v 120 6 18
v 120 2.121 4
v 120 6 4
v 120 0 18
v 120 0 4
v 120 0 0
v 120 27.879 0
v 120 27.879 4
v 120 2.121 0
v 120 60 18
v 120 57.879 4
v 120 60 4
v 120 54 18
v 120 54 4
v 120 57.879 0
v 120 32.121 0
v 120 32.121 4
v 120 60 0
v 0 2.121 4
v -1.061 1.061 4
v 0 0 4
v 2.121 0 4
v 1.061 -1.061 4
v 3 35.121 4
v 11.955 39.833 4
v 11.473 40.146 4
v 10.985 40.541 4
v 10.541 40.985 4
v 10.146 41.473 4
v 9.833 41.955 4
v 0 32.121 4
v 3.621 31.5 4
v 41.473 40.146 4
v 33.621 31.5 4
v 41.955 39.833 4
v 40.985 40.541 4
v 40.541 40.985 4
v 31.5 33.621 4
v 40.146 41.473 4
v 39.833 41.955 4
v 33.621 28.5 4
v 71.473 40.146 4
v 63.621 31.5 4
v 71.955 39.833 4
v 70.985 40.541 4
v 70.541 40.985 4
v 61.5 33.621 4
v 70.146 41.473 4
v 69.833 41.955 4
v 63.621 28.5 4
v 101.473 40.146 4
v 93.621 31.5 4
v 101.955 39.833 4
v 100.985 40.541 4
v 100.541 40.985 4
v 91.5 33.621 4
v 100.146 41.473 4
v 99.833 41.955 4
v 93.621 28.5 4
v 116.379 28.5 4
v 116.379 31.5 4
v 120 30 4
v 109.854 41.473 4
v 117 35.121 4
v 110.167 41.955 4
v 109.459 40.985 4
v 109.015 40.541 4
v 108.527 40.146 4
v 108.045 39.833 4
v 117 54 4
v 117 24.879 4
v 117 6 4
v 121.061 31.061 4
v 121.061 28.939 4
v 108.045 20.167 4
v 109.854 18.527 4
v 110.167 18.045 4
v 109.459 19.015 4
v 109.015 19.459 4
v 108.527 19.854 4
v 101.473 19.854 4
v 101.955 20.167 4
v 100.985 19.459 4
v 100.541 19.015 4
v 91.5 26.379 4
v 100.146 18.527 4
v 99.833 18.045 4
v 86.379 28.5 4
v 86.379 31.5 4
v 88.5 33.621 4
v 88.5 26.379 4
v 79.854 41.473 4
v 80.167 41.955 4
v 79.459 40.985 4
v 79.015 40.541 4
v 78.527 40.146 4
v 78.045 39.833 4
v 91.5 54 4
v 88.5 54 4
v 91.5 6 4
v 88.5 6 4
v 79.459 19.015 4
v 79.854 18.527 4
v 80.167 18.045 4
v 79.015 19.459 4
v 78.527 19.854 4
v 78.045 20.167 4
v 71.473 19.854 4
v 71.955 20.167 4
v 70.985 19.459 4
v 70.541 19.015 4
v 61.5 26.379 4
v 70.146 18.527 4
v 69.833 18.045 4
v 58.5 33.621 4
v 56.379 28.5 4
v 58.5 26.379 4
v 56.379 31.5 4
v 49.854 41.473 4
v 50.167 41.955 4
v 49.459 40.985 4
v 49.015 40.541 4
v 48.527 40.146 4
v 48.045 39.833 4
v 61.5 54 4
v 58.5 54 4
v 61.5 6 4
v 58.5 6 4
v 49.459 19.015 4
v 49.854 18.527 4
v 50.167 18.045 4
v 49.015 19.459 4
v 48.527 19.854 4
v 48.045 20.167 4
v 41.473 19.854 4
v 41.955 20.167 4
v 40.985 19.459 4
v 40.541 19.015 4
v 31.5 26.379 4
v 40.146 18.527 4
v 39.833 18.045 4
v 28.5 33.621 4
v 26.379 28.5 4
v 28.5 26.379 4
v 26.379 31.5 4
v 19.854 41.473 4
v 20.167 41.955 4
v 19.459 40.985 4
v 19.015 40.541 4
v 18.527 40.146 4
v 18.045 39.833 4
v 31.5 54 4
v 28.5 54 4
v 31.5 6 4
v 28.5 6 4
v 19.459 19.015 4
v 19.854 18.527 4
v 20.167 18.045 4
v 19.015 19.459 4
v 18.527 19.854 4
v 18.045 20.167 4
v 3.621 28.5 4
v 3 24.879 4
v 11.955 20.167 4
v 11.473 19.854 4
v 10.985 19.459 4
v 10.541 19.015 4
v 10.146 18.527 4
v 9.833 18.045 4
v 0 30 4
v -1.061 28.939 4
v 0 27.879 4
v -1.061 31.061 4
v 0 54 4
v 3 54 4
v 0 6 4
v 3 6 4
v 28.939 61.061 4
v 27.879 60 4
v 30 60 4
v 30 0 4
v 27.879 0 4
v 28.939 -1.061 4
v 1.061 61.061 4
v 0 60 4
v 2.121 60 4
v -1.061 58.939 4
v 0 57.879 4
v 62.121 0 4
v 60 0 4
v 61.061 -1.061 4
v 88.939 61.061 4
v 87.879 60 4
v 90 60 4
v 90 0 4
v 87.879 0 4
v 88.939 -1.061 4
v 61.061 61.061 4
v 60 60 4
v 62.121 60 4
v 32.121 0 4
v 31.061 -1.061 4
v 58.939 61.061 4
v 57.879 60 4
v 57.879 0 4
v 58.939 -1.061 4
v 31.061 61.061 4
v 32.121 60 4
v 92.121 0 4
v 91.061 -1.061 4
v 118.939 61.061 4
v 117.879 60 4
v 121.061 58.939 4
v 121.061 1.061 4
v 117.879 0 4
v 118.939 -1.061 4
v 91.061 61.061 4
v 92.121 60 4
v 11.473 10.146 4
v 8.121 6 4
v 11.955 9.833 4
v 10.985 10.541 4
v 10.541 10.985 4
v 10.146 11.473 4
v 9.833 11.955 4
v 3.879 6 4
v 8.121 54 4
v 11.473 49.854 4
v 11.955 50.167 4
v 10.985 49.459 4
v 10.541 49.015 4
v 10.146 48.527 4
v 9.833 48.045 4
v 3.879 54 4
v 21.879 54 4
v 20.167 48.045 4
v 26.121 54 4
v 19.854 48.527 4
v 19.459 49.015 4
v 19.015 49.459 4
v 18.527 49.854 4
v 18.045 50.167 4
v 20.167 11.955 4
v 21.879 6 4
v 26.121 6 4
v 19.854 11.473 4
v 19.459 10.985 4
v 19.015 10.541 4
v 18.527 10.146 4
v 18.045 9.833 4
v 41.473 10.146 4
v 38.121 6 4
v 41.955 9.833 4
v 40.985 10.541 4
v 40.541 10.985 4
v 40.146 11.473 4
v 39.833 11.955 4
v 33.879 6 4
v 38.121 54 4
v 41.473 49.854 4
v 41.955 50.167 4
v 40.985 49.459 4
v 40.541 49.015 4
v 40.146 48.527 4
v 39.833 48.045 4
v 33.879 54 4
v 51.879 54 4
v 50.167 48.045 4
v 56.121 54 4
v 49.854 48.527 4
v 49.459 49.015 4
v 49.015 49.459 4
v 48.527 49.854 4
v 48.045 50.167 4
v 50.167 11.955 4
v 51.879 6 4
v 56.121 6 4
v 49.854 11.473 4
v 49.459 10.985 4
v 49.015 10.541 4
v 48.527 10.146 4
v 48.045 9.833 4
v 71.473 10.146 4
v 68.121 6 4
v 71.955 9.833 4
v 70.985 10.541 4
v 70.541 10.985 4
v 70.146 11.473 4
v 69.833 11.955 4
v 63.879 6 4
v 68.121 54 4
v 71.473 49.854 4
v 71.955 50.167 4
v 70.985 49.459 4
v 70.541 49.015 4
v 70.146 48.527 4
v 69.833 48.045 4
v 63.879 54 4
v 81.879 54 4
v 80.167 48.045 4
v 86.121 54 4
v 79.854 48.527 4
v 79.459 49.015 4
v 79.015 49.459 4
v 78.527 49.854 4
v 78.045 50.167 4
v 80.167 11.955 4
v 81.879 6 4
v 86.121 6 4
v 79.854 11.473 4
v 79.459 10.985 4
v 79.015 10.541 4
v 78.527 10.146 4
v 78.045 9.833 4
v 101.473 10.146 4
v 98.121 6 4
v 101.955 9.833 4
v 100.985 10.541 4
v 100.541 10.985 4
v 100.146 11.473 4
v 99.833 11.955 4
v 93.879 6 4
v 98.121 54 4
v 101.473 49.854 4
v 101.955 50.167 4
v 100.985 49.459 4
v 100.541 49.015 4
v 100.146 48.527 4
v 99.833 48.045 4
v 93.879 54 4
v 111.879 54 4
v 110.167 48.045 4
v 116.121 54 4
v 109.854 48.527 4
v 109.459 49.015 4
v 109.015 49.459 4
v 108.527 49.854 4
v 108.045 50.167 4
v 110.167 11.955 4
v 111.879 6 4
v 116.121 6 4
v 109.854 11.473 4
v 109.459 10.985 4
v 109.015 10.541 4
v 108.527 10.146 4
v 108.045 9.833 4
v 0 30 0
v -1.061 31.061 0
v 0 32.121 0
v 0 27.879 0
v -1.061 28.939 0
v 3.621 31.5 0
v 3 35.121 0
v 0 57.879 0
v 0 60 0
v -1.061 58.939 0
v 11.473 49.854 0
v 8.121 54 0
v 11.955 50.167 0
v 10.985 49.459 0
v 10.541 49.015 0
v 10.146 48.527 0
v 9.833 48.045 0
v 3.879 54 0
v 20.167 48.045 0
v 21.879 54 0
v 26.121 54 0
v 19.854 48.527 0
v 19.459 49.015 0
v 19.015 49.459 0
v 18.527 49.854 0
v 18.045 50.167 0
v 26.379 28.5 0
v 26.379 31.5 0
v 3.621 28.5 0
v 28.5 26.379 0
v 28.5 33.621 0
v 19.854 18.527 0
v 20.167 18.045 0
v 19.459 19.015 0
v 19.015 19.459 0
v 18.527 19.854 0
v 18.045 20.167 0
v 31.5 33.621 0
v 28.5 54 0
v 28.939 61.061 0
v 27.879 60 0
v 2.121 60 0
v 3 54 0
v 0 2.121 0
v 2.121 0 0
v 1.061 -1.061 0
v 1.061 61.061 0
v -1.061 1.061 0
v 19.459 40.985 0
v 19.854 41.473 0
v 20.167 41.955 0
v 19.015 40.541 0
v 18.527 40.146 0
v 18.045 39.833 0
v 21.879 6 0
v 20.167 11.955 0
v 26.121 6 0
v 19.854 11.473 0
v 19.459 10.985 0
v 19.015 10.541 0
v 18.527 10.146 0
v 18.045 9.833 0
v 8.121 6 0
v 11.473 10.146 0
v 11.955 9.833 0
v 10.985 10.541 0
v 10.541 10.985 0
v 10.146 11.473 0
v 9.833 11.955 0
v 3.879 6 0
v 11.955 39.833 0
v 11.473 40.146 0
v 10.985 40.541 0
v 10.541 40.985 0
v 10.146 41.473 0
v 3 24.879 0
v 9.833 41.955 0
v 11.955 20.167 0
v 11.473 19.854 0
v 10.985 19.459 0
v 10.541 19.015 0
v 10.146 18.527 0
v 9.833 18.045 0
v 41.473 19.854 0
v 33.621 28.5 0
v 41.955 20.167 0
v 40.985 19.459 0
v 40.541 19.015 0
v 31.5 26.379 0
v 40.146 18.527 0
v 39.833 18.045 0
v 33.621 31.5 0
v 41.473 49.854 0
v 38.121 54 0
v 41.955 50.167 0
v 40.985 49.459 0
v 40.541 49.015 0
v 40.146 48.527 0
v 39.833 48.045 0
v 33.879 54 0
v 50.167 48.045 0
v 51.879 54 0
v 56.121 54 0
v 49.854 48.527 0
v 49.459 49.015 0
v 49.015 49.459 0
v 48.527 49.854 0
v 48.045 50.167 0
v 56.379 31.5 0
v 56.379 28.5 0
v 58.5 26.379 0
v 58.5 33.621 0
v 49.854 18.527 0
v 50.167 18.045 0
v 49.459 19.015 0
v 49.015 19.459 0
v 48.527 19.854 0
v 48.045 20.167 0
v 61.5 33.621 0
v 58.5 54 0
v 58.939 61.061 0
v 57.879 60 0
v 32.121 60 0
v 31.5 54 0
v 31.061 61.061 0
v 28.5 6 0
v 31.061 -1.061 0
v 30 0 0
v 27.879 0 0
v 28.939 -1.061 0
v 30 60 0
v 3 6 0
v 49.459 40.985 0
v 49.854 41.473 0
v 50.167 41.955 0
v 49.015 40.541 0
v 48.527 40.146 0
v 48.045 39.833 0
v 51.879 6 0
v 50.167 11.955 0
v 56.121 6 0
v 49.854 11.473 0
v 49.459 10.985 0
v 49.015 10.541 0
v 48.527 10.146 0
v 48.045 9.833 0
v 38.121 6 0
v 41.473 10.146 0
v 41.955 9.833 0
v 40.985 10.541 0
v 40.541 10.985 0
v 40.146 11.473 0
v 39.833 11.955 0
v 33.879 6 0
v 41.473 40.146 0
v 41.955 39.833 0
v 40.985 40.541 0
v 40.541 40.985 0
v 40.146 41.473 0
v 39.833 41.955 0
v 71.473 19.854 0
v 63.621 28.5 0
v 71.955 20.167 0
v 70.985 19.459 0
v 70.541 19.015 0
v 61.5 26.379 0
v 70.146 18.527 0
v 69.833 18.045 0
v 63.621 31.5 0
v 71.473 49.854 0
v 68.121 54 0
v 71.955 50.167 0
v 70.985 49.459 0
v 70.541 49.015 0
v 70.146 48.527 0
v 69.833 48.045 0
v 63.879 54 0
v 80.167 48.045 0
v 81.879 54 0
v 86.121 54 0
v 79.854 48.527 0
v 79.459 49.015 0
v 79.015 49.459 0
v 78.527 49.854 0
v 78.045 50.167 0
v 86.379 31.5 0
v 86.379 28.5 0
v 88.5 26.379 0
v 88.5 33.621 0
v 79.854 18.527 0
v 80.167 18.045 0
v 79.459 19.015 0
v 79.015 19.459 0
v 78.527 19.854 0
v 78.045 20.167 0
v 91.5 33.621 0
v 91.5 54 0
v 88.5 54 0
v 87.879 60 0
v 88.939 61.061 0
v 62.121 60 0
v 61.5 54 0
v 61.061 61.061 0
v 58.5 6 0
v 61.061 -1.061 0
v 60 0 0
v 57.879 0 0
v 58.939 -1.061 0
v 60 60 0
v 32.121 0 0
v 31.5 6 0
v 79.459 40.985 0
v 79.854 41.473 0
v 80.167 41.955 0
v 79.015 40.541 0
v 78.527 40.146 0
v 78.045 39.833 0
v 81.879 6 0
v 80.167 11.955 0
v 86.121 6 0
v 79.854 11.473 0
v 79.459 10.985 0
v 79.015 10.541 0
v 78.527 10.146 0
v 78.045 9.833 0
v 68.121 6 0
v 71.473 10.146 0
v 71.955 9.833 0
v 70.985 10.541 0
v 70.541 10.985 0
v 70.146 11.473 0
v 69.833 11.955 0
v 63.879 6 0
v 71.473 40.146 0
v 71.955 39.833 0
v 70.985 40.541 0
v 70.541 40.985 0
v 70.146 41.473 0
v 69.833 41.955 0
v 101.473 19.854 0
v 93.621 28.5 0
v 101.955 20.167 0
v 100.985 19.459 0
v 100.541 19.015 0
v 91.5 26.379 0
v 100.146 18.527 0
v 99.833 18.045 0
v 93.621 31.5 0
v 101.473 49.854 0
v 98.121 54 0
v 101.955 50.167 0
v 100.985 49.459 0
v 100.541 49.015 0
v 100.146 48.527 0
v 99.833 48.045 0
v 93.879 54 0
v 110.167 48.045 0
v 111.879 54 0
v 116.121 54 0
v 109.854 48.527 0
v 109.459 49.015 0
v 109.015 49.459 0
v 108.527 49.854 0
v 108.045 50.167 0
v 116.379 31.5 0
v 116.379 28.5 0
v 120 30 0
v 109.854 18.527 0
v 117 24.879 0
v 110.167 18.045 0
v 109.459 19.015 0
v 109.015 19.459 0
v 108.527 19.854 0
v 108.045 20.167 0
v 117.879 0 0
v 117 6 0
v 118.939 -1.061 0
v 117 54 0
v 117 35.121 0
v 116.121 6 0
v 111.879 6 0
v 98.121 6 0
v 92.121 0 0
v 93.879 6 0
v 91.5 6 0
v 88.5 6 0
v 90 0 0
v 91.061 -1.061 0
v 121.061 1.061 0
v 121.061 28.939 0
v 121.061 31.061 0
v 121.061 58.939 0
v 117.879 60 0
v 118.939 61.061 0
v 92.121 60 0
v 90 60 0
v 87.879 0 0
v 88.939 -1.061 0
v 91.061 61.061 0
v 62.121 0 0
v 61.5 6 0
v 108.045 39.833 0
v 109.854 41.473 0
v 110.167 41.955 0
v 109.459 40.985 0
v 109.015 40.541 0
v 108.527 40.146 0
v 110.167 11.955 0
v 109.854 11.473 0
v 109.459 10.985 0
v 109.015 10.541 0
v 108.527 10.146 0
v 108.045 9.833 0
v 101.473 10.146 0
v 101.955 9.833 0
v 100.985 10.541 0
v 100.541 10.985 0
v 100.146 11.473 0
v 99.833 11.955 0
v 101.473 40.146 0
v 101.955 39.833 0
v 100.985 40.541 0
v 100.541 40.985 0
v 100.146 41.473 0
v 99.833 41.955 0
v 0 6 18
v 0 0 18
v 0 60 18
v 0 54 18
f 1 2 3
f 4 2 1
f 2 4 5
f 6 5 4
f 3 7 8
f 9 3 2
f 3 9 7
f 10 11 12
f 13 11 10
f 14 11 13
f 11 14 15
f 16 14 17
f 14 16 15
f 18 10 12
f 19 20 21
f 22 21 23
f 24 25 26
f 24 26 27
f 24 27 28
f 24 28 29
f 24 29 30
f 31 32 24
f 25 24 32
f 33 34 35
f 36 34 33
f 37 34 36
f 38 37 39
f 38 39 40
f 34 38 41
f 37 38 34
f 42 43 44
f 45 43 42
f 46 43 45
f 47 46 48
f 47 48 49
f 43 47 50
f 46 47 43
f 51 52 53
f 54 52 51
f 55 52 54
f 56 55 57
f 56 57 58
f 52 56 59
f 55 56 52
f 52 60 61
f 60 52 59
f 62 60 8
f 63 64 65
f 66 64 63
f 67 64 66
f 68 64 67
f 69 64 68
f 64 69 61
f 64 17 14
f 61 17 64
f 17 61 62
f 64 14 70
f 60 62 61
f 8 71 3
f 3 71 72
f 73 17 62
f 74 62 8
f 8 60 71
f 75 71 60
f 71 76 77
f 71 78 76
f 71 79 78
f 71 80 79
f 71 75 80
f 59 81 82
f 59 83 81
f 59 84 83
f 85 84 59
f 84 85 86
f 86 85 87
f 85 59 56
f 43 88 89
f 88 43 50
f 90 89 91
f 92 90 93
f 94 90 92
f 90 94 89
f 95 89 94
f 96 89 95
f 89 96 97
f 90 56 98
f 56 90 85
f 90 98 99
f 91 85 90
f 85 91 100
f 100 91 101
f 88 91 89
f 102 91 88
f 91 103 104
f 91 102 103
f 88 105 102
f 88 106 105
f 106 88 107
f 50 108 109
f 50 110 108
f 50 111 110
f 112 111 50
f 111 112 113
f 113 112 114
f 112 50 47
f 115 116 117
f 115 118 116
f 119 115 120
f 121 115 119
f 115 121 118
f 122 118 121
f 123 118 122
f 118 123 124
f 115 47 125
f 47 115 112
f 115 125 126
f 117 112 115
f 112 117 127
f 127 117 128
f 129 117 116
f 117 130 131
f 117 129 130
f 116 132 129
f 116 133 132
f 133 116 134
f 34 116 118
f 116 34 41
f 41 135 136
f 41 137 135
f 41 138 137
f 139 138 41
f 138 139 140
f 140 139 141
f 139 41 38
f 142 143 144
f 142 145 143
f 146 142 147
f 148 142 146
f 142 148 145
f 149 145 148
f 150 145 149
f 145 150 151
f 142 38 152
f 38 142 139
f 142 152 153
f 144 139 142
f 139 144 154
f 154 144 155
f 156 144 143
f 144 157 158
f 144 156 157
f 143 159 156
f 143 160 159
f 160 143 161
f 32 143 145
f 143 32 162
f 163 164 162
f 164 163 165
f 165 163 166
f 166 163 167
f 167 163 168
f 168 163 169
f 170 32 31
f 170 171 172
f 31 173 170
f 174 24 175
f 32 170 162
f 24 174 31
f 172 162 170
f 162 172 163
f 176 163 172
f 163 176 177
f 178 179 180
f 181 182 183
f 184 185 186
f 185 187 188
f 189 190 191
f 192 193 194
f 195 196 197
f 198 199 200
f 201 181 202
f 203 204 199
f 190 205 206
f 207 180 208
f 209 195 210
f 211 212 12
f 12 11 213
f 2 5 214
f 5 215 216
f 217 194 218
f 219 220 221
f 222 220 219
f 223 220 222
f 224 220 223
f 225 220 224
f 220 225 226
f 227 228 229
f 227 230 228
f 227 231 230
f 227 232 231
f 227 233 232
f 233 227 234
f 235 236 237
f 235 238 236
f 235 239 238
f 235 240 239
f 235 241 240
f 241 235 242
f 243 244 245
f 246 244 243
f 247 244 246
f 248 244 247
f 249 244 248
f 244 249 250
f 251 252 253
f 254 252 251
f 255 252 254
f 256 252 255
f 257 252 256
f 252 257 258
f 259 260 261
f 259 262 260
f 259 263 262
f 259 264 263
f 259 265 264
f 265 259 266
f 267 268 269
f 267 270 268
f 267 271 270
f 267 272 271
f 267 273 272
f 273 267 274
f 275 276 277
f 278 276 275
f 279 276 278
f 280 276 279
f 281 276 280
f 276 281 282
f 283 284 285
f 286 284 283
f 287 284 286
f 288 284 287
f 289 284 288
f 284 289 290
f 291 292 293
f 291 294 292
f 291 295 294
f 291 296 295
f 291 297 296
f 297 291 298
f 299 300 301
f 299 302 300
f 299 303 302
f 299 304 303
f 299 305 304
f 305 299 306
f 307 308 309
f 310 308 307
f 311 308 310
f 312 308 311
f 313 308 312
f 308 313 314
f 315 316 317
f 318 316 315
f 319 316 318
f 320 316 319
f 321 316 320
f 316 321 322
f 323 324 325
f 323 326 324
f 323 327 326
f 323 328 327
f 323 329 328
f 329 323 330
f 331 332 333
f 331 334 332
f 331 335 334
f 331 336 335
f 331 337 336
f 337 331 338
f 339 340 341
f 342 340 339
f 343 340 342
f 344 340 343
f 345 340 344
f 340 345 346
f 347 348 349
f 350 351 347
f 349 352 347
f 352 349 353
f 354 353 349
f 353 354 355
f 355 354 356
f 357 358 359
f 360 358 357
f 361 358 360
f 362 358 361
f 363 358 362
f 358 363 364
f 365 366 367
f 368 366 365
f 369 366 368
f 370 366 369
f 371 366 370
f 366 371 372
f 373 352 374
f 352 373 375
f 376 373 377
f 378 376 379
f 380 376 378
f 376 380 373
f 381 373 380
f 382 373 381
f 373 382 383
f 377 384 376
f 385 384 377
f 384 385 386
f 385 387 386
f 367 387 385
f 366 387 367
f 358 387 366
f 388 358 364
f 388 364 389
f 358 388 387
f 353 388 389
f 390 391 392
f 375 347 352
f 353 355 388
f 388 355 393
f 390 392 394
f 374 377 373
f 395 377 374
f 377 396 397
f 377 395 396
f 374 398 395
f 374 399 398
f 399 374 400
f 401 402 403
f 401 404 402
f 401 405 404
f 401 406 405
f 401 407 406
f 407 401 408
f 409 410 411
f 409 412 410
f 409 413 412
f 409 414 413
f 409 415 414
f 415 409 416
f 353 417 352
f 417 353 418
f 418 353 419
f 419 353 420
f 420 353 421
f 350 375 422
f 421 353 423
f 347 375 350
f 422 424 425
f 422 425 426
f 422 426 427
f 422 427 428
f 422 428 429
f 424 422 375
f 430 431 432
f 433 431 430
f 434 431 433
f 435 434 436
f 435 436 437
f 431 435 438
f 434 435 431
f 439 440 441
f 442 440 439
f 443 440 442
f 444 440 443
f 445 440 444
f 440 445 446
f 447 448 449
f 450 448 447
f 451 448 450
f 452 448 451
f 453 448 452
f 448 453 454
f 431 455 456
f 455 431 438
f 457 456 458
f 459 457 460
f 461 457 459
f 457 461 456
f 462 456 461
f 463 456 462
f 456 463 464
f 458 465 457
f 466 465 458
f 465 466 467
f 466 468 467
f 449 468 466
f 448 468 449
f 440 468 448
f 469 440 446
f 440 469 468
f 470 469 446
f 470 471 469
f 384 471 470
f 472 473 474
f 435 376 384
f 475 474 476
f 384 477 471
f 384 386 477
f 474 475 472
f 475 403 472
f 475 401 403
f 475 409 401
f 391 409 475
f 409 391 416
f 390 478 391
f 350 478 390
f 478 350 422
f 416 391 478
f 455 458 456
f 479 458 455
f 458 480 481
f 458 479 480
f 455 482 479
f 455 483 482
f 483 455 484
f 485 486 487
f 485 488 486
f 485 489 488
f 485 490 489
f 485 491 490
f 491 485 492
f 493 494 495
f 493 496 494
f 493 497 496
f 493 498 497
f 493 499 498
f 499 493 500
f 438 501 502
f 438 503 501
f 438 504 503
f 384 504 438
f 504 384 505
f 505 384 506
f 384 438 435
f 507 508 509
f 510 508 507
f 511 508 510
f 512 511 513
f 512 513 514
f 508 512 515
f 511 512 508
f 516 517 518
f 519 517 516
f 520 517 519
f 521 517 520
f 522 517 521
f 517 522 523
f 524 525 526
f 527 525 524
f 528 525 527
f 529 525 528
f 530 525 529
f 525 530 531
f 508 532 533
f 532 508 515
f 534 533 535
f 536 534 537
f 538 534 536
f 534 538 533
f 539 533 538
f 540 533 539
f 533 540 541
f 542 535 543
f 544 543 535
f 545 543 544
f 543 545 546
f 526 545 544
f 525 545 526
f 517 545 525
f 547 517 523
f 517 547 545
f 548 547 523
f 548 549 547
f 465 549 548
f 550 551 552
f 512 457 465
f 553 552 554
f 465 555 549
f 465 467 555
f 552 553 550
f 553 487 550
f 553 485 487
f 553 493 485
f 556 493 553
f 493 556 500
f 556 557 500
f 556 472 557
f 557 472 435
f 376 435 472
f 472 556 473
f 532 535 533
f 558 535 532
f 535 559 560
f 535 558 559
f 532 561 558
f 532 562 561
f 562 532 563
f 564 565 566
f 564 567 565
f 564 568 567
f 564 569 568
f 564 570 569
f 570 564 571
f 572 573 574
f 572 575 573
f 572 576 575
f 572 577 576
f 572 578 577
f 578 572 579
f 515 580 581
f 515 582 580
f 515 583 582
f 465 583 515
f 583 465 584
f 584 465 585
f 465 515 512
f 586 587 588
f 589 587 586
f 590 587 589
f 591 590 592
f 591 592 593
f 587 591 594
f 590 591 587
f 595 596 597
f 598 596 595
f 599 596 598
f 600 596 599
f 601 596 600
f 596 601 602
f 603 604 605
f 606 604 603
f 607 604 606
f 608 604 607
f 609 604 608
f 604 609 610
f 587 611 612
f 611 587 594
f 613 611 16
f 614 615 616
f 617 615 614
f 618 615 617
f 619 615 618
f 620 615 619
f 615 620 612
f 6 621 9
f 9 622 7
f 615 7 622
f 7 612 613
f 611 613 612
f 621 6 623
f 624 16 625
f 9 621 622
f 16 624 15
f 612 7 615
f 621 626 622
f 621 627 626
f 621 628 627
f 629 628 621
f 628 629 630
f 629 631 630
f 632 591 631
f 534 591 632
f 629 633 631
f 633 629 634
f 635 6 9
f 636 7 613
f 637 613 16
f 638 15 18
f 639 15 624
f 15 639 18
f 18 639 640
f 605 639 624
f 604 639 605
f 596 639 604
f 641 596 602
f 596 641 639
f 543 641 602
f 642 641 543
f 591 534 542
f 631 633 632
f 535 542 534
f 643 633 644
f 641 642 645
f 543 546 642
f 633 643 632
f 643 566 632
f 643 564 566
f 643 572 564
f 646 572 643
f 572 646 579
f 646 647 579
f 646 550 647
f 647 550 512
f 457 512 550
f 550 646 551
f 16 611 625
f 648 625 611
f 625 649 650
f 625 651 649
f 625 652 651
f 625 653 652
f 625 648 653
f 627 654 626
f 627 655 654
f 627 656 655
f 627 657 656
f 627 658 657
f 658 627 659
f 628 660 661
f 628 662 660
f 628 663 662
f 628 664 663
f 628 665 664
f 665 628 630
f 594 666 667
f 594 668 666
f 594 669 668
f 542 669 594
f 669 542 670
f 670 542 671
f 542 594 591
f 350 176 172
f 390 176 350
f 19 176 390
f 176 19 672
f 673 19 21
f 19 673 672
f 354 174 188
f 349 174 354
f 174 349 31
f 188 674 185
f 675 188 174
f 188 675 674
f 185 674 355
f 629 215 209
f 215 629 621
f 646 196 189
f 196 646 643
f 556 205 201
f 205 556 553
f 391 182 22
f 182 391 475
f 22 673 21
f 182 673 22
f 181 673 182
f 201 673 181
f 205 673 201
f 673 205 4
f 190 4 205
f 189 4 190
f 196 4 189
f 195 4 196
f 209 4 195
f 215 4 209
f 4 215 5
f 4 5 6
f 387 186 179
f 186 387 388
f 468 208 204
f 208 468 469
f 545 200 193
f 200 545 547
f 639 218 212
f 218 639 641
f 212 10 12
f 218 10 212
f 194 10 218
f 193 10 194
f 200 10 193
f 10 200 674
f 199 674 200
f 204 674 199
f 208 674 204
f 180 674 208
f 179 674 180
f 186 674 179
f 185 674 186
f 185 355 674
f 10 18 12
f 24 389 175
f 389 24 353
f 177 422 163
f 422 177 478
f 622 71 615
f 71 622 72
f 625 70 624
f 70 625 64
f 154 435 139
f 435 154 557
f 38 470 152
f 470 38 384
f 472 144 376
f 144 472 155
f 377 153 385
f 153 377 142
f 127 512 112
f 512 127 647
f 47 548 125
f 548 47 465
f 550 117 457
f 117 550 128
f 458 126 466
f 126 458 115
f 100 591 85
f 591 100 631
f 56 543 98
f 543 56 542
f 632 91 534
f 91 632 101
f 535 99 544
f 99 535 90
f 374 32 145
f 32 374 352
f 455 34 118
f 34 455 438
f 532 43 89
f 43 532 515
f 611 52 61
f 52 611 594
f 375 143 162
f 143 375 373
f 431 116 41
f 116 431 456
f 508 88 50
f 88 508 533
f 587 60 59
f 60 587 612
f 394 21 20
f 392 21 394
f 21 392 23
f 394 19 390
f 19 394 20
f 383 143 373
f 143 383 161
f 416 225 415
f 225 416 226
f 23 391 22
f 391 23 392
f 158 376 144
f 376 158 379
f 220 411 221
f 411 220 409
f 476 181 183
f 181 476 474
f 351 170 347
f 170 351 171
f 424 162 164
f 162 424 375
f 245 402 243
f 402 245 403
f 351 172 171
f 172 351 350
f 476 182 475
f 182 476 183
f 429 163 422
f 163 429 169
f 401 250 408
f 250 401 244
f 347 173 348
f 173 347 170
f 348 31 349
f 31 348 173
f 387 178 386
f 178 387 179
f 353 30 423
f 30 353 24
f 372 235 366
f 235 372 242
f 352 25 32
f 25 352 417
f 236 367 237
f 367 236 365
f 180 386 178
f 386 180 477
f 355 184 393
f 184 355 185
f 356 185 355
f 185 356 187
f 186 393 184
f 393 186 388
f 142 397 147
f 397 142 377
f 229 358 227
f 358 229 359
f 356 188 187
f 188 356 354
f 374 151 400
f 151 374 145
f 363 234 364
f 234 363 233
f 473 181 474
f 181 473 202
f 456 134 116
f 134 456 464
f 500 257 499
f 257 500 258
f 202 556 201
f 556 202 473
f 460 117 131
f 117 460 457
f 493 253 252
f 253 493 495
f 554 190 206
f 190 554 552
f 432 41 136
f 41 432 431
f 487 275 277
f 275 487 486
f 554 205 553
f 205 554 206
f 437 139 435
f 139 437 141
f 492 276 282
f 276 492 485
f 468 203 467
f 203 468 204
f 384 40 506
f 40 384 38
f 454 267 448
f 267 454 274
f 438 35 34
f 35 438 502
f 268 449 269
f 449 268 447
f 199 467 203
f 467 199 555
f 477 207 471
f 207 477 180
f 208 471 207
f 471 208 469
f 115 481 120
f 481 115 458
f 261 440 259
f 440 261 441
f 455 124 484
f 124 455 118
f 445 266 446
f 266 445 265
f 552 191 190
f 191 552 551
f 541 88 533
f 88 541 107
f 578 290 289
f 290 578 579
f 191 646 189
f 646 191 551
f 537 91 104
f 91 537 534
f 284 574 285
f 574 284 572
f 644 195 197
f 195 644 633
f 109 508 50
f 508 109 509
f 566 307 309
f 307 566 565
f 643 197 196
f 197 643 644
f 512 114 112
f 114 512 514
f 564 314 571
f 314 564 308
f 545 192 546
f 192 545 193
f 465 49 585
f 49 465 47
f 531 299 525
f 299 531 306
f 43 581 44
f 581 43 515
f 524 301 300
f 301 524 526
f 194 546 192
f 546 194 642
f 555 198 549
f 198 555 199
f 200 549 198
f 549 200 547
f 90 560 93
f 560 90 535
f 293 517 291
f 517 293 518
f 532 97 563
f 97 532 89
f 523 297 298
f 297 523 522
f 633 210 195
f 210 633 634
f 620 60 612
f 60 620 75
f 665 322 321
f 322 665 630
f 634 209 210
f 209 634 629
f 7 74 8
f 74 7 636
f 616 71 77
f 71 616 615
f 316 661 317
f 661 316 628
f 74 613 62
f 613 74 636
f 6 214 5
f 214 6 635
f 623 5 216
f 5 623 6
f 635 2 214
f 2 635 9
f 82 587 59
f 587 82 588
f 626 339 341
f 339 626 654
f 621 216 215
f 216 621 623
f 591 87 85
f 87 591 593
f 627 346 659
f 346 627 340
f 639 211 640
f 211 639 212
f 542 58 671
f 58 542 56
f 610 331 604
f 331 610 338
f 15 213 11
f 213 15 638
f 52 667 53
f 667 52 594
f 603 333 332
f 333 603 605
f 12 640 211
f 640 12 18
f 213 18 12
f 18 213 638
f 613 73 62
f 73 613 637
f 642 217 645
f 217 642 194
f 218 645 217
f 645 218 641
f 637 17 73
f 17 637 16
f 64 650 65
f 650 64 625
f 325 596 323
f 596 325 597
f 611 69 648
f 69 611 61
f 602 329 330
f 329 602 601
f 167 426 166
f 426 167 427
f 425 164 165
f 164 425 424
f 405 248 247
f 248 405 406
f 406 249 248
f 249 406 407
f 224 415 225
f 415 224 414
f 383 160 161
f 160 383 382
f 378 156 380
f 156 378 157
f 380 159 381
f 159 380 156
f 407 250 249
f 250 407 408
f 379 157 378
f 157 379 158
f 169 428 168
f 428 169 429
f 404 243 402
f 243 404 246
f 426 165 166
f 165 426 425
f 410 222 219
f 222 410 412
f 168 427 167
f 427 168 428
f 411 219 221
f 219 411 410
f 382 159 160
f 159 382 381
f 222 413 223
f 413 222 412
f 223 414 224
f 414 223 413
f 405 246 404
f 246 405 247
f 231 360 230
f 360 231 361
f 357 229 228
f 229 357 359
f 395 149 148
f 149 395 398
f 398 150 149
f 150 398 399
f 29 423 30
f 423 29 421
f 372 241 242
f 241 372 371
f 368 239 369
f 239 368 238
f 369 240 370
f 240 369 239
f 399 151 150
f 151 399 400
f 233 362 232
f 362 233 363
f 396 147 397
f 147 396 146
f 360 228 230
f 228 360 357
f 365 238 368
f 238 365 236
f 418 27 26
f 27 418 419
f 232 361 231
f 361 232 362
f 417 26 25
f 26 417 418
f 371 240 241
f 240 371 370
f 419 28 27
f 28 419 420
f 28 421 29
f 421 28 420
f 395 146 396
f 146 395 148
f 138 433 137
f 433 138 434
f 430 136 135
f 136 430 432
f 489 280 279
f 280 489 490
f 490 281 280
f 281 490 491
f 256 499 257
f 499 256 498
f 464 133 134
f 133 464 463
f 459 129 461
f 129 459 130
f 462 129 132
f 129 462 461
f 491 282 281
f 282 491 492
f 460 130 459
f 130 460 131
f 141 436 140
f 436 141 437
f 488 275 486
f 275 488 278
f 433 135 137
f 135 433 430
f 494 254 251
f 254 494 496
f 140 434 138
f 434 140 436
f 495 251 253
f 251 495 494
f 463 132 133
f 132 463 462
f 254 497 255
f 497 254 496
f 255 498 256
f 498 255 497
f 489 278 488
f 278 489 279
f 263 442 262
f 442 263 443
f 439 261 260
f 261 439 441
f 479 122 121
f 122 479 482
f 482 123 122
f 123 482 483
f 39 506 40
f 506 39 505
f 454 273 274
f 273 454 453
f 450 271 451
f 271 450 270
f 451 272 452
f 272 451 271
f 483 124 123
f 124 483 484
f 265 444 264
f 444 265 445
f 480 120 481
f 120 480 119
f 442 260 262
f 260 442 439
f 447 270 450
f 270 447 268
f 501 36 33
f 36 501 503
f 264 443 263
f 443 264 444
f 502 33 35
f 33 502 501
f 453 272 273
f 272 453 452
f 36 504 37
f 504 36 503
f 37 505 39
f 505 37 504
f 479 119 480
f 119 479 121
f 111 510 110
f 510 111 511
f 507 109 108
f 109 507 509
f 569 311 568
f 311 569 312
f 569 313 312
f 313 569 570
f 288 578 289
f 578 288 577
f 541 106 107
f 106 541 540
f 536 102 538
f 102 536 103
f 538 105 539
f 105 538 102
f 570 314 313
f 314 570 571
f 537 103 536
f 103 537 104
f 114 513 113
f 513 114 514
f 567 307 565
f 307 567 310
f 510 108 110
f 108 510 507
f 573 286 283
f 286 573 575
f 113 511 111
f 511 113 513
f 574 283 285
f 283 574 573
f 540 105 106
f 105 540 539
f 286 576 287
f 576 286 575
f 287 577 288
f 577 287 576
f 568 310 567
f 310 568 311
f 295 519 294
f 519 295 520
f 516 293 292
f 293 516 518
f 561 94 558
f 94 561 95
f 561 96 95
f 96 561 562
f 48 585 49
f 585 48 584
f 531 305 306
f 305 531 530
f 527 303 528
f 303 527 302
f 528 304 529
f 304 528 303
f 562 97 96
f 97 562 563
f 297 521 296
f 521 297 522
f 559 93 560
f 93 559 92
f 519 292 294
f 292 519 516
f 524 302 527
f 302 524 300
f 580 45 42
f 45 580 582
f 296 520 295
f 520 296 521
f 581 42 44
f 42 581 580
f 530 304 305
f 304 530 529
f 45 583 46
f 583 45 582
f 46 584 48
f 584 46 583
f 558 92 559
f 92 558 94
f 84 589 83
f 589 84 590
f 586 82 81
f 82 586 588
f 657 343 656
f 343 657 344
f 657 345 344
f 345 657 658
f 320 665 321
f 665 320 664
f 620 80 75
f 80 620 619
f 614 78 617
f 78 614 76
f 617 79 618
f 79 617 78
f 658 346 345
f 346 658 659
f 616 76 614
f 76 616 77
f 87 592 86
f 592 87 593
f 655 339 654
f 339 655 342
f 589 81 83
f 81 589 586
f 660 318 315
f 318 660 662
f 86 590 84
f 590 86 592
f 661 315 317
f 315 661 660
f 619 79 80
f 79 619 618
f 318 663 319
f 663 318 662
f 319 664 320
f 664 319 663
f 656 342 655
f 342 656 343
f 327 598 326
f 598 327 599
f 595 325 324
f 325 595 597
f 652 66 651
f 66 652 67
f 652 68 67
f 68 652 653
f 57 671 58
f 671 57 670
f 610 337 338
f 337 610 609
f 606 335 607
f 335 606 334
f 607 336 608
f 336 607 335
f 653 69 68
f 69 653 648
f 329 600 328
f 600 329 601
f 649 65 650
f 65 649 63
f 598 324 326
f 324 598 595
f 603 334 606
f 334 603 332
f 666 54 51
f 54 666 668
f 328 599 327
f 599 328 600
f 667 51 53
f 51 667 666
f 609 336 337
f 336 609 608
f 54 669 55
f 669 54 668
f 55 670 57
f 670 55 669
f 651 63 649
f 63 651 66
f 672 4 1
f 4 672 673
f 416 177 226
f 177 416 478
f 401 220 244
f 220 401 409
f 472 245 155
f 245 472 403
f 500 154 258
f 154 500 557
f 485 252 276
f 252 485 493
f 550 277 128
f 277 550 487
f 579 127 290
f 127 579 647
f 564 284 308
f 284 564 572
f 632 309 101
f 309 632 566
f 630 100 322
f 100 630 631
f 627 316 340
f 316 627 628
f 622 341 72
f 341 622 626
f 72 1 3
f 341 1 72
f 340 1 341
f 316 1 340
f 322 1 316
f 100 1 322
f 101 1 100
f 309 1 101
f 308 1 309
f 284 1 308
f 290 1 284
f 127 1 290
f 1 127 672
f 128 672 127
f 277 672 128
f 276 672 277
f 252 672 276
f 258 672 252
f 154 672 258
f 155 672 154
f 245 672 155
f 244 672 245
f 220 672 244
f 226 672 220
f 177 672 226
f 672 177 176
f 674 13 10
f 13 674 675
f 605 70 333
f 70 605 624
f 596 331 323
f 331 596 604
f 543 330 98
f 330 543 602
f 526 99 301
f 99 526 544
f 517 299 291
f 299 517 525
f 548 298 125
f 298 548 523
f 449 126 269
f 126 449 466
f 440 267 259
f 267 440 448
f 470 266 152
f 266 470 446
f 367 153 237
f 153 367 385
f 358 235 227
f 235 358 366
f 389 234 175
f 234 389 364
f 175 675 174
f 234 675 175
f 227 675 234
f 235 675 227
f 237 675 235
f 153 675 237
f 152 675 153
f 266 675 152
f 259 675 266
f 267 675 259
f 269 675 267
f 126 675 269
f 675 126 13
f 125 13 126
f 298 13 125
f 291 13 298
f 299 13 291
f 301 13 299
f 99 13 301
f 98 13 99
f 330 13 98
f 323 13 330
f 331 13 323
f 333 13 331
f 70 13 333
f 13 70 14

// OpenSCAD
// === Parameters ===

// Overall dimensions
length       = 120;    // Long dimension (X)
width        = 60;     // Short dimension (Y)
web_height   = 4;      // Shallow rib/web height (Z)
wall_height  = 18;     // Taller side-wall height (Z)
rib_width    = 3;      // Thickness of each rib
wall_thick   = 6;      // Thickness of each side wall

// Bay layout
num_bays_x   = 4;      // Divisions along length
num_bays_y   = 2;      // Divisions along width

// Circular voids
hole_diam    = 12;     // Diameter of circular openings

$fn = 60;

// Derived quantities
bay_lx = length / num_bays_x;
bay_ly = width  / num_bays_y;

// === Helper: rib between two 2-D points ===
module rib_beam(p0, p1, w, h) {
    dx  = p1[0] - p0[0];
    dy  = p1[1] - p0[1];
    l   = sqrt(dx*dx + dy*dy);
    ang = atan2(dy, dx);
    translate([p0[0], p0[1], 0])
        rotate([0, 0, ang])
            translate([0, -w/2, 0])
                cube([l, w, h]);
}

// === Perimeter frame (4 edges at web height) ===
module perimeter_ribs() {
    // Bottom (Y = 0)
    cube([length, rib_width, web_height]);
    // Top (Y = width)
    translate([0, width - rib_width, 0])
        cube([length, rib_width, web_height]);
    // Left (X = 0)
    cube([rib_width, width, web_height]);
    // Right (X = length)
    translate([length - rib_width, 0, 0])
        cube([rib_width, width, web_height]);
}

// === Internal orthogonal cross ribs ===
module cross_ribs() {
    // Transverse ribs (run along Y at each bay boundary)
    for (i = [1 : num_bays_x - 1])
        translate([i * bay_lx - rib_width/2, 0, 0])
            cube([rib_width, width, web_height]);

    // Longitudinal ribs (run along X at each bay boundary)
    for (j = [1 : num_bays_y - 1])
        translate([0, j * bay_ly - rib_width/2, 0])
            cube([length, rib_width, web_height]);
}

// === Diagonal ribs inside every bay (X-pattern) ===
module diagonal_ribs() {
    for (i = [0 : num_bays_x - 1]) {
        for (j = [0 : num_bays_y - 1]) {
            x0 = i * bay_lx;
            y0 = j * bay_ly;
            x1 = (i + 1) * bay_lx;
            y1 = (j + 1) * bay_ly;

            // Two crossing diagonals per bay
            rib_beam([x0, y0], [x1, y1], rib_width, web_height);
            rib_beam([x0, y1], [x1, y0], rib_width, web_height);
        }
    }
}

// === Circular openings (voids) centred in each bay ===
module circular_voids() {
    for (i = [0 : num_bays_x - 1]) {
        for (j = [0 : num_bays_y - 1]) {
            cx = (i + 0.5) * bay_lx;
            cy = (j + 0.5) * bay_ly;
            translate([cx, cy, -1])
                cylinder(d = hole_diam, h = web_height + 2);
        }
    }
}

// === Solid side walls along the two long edges ===
module side_walls() {
    // Front wall (Y = 0 side)
    cube([length, wall_thick, wall_height]);
    // Back wall (Y = width side)
    translate([0, width - wall_thick, 0])
        cube([length, wall_thick, wall_height]);
}

// === Final assembly ===
union() {
    // Open web: ribs minus circular voids
    difference() {
        union() {
            perimeter_ribs();
            cross_ribs();
            diagonal_ribs();
        }
        circular_voids();
    }

    // Tall side walls (solid, higher than web)
    side_walls();
}
